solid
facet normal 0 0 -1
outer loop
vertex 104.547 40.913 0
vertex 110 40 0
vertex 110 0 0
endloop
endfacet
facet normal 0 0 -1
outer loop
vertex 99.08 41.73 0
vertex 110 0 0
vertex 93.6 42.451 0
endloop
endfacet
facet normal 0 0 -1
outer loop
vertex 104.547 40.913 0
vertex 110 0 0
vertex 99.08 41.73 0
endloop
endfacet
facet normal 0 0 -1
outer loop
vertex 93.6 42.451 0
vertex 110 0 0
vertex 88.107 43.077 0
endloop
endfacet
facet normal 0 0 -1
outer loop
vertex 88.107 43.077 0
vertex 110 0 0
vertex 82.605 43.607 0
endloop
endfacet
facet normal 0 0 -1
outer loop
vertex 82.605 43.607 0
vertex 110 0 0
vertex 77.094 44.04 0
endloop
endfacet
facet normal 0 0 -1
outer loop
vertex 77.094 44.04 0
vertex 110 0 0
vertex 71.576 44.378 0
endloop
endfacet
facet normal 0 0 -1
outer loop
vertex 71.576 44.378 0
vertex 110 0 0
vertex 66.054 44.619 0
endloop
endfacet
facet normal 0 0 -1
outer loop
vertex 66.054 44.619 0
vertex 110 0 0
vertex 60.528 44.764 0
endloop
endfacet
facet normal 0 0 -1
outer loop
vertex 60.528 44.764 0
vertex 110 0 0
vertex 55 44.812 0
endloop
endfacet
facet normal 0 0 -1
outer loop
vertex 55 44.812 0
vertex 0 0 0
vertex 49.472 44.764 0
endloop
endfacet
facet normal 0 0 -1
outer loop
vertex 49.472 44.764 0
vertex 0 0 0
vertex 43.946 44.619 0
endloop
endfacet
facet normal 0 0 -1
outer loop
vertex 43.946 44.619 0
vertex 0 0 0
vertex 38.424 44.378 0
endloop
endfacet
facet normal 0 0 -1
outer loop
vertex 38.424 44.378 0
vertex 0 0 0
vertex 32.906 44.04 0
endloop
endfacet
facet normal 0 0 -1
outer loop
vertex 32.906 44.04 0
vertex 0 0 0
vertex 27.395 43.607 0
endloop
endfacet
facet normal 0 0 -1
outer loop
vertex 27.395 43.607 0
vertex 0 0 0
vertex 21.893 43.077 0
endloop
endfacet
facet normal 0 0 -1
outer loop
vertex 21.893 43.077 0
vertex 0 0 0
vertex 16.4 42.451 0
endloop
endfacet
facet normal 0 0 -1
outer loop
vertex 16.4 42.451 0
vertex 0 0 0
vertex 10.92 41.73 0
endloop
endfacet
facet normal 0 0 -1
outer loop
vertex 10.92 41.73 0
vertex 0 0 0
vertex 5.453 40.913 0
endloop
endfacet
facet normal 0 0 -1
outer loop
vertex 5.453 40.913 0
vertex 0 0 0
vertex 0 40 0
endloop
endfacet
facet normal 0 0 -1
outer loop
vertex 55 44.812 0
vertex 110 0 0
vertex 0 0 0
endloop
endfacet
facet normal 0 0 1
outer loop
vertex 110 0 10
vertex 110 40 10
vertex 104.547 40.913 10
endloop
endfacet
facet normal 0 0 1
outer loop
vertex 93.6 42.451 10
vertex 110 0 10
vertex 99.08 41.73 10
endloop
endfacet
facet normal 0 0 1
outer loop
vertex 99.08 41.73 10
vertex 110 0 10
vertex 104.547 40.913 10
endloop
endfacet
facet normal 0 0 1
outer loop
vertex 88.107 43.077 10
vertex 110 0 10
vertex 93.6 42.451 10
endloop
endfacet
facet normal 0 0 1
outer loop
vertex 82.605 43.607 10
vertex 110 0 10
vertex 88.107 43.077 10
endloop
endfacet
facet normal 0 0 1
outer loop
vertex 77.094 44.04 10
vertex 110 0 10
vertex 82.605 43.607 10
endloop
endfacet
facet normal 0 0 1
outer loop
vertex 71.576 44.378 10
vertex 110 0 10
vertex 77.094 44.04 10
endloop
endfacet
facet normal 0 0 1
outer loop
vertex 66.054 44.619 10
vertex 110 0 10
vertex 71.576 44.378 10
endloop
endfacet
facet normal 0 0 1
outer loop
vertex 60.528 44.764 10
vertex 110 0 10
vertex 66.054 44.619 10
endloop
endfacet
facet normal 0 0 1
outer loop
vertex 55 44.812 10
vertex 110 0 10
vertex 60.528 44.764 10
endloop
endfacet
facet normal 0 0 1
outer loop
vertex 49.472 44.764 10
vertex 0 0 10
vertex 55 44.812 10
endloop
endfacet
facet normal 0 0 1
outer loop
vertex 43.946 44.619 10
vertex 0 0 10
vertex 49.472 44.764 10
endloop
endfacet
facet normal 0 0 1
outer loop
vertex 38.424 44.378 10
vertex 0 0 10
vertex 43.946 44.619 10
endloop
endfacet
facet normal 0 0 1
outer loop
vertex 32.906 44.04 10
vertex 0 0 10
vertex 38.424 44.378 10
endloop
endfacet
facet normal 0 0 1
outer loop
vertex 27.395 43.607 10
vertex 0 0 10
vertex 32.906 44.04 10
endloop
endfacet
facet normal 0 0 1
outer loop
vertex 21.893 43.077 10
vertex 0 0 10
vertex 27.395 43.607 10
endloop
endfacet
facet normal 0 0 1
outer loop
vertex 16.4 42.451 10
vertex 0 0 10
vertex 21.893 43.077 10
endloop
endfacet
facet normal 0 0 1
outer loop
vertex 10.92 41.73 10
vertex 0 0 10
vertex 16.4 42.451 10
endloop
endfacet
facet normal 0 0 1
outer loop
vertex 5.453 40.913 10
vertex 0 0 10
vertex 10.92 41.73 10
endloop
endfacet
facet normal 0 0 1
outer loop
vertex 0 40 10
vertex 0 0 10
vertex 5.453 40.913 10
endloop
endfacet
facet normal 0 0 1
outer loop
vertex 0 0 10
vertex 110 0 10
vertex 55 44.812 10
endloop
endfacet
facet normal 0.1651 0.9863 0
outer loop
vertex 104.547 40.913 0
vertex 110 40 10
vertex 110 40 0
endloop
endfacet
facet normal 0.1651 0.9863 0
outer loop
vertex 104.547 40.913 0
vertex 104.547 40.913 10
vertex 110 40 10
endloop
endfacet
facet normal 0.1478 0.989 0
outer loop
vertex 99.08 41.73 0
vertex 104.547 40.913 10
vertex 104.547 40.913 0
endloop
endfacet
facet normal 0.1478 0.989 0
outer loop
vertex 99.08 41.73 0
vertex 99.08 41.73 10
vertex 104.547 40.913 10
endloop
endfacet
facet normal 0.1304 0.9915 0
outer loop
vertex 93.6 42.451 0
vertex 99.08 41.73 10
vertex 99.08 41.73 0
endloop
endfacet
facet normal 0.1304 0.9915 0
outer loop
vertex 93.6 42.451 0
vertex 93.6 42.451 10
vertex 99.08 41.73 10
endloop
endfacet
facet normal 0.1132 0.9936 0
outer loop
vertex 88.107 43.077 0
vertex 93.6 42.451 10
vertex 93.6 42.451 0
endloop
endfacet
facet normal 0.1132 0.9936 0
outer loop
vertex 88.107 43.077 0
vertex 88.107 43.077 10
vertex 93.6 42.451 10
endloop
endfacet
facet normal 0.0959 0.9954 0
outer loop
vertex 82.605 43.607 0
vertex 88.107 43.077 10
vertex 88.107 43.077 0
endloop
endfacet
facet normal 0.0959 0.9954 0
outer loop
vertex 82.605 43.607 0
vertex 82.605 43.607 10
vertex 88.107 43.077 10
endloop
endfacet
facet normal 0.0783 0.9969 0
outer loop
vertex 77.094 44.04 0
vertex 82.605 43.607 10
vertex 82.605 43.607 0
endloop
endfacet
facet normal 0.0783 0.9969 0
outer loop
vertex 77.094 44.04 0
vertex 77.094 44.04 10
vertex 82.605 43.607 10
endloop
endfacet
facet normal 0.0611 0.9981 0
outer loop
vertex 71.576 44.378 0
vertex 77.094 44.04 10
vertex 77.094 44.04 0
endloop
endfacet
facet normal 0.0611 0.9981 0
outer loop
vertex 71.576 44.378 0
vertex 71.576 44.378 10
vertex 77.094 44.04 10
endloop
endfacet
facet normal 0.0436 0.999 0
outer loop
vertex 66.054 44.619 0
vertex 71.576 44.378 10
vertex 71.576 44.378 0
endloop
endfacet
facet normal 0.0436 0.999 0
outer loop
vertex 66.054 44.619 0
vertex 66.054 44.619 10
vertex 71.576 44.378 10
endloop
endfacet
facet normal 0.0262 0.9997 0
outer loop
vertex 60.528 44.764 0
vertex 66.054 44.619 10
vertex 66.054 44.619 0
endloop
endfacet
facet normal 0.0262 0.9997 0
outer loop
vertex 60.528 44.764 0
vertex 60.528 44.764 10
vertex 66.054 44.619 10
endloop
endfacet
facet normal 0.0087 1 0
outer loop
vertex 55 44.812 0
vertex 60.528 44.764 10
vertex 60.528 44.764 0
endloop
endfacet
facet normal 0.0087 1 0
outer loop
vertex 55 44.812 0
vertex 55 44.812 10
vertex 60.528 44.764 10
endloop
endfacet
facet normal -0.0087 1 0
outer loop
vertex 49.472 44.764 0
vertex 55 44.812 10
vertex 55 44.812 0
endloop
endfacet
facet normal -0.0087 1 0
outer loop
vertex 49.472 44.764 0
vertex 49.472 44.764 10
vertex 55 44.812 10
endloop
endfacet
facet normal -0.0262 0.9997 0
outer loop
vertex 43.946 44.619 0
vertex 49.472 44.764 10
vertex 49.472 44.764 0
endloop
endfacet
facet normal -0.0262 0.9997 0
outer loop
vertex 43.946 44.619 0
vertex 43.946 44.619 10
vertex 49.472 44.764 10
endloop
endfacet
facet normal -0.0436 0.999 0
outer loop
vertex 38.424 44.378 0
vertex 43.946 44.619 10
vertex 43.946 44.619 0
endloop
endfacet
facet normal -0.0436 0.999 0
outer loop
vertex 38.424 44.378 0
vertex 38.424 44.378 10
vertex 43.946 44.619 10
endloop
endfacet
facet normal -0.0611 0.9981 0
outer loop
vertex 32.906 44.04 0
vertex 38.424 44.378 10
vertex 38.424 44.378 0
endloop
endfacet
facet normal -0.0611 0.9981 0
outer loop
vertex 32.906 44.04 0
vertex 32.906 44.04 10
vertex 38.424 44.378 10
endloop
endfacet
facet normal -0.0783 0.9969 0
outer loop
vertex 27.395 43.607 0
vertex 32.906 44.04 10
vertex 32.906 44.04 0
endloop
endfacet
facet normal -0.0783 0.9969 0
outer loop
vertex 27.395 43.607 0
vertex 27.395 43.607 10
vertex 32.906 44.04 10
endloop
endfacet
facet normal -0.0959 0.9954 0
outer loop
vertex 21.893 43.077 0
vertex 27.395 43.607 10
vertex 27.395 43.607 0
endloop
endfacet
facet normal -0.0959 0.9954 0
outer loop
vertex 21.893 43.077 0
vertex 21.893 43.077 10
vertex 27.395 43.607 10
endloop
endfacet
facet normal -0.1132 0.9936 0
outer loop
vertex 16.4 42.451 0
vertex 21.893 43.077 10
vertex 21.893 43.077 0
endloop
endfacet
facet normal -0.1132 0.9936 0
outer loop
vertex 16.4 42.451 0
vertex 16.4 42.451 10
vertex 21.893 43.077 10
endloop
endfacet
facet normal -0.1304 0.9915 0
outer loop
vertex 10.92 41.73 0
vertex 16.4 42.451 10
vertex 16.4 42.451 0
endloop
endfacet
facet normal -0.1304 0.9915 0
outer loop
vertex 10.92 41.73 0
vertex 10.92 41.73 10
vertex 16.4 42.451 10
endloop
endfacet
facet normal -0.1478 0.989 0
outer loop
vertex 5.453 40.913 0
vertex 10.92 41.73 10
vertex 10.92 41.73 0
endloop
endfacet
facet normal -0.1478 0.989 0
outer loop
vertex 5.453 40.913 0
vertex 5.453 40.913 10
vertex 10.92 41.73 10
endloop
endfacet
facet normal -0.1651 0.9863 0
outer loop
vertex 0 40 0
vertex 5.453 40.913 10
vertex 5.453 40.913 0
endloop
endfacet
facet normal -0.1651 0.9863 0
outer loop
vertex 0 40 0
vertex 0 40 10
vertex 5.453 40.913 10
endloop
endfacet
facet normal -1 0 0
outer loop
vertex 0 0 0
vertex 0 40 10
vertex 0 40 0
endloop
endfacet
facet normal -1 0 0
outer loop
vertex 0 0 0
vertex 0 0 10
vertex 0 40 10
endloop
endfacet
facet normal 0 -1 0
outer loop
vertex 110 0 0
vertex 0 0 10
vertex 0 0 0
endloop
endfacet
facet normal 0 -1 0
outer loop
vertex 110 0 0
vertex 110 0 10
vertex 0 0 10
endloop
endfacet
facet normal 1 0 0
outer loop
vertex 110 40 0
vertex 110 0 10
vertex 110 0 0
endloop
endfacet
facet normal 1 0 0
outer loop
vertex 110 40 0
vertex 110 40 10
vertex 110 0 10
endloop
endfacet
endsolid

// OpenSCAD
$fn = 32;

// ----------------------------------------------------------------------
// Arc profile plate: crown, 23 points
// ----------------------------------------------------------------------

// --- parameters (mm) ---
bar_l = 110;              // bar length, X
bar_w = 40;               // bar height at the ends, Y
arc_r = 316.73;           // radius of the crown arc
arc_angle = 20;           // crown arc angle, degrees
crown_rise = 4.81;        // rise of the crown over the ends
arc_step = 1;             // sampling step of the crown arc, degrees
plate_t = 10;             // plate thickness, Z

bbox_y = bar_w + crown_rise;  // full height with the crown

profile = [[110, 40], [104.547, 40.913], [99.08, 41.73], [93.6, 42.451], [88.107, 43.077], [82.605, 43.607], [77.094, 44.04], [71.576, 44.378], [66.054, 44.619], [60.528, 44.764], [55, 44.812], [49.472, 44.764], [43.946, 44.619], [38.424, 44.378], [32.906, 44.04], [27.395, 43.607], [21.893, 43.077], [16.4, 42.451], [10.92, 41.73], [5.453, 40.913], [0, 40], [0, 0], [110, 0]];  // primary outline, 23 points, counter clockwise

// --- the one profile operation ---
linear_extrude(height = plate_t) polygon(points = profile);
